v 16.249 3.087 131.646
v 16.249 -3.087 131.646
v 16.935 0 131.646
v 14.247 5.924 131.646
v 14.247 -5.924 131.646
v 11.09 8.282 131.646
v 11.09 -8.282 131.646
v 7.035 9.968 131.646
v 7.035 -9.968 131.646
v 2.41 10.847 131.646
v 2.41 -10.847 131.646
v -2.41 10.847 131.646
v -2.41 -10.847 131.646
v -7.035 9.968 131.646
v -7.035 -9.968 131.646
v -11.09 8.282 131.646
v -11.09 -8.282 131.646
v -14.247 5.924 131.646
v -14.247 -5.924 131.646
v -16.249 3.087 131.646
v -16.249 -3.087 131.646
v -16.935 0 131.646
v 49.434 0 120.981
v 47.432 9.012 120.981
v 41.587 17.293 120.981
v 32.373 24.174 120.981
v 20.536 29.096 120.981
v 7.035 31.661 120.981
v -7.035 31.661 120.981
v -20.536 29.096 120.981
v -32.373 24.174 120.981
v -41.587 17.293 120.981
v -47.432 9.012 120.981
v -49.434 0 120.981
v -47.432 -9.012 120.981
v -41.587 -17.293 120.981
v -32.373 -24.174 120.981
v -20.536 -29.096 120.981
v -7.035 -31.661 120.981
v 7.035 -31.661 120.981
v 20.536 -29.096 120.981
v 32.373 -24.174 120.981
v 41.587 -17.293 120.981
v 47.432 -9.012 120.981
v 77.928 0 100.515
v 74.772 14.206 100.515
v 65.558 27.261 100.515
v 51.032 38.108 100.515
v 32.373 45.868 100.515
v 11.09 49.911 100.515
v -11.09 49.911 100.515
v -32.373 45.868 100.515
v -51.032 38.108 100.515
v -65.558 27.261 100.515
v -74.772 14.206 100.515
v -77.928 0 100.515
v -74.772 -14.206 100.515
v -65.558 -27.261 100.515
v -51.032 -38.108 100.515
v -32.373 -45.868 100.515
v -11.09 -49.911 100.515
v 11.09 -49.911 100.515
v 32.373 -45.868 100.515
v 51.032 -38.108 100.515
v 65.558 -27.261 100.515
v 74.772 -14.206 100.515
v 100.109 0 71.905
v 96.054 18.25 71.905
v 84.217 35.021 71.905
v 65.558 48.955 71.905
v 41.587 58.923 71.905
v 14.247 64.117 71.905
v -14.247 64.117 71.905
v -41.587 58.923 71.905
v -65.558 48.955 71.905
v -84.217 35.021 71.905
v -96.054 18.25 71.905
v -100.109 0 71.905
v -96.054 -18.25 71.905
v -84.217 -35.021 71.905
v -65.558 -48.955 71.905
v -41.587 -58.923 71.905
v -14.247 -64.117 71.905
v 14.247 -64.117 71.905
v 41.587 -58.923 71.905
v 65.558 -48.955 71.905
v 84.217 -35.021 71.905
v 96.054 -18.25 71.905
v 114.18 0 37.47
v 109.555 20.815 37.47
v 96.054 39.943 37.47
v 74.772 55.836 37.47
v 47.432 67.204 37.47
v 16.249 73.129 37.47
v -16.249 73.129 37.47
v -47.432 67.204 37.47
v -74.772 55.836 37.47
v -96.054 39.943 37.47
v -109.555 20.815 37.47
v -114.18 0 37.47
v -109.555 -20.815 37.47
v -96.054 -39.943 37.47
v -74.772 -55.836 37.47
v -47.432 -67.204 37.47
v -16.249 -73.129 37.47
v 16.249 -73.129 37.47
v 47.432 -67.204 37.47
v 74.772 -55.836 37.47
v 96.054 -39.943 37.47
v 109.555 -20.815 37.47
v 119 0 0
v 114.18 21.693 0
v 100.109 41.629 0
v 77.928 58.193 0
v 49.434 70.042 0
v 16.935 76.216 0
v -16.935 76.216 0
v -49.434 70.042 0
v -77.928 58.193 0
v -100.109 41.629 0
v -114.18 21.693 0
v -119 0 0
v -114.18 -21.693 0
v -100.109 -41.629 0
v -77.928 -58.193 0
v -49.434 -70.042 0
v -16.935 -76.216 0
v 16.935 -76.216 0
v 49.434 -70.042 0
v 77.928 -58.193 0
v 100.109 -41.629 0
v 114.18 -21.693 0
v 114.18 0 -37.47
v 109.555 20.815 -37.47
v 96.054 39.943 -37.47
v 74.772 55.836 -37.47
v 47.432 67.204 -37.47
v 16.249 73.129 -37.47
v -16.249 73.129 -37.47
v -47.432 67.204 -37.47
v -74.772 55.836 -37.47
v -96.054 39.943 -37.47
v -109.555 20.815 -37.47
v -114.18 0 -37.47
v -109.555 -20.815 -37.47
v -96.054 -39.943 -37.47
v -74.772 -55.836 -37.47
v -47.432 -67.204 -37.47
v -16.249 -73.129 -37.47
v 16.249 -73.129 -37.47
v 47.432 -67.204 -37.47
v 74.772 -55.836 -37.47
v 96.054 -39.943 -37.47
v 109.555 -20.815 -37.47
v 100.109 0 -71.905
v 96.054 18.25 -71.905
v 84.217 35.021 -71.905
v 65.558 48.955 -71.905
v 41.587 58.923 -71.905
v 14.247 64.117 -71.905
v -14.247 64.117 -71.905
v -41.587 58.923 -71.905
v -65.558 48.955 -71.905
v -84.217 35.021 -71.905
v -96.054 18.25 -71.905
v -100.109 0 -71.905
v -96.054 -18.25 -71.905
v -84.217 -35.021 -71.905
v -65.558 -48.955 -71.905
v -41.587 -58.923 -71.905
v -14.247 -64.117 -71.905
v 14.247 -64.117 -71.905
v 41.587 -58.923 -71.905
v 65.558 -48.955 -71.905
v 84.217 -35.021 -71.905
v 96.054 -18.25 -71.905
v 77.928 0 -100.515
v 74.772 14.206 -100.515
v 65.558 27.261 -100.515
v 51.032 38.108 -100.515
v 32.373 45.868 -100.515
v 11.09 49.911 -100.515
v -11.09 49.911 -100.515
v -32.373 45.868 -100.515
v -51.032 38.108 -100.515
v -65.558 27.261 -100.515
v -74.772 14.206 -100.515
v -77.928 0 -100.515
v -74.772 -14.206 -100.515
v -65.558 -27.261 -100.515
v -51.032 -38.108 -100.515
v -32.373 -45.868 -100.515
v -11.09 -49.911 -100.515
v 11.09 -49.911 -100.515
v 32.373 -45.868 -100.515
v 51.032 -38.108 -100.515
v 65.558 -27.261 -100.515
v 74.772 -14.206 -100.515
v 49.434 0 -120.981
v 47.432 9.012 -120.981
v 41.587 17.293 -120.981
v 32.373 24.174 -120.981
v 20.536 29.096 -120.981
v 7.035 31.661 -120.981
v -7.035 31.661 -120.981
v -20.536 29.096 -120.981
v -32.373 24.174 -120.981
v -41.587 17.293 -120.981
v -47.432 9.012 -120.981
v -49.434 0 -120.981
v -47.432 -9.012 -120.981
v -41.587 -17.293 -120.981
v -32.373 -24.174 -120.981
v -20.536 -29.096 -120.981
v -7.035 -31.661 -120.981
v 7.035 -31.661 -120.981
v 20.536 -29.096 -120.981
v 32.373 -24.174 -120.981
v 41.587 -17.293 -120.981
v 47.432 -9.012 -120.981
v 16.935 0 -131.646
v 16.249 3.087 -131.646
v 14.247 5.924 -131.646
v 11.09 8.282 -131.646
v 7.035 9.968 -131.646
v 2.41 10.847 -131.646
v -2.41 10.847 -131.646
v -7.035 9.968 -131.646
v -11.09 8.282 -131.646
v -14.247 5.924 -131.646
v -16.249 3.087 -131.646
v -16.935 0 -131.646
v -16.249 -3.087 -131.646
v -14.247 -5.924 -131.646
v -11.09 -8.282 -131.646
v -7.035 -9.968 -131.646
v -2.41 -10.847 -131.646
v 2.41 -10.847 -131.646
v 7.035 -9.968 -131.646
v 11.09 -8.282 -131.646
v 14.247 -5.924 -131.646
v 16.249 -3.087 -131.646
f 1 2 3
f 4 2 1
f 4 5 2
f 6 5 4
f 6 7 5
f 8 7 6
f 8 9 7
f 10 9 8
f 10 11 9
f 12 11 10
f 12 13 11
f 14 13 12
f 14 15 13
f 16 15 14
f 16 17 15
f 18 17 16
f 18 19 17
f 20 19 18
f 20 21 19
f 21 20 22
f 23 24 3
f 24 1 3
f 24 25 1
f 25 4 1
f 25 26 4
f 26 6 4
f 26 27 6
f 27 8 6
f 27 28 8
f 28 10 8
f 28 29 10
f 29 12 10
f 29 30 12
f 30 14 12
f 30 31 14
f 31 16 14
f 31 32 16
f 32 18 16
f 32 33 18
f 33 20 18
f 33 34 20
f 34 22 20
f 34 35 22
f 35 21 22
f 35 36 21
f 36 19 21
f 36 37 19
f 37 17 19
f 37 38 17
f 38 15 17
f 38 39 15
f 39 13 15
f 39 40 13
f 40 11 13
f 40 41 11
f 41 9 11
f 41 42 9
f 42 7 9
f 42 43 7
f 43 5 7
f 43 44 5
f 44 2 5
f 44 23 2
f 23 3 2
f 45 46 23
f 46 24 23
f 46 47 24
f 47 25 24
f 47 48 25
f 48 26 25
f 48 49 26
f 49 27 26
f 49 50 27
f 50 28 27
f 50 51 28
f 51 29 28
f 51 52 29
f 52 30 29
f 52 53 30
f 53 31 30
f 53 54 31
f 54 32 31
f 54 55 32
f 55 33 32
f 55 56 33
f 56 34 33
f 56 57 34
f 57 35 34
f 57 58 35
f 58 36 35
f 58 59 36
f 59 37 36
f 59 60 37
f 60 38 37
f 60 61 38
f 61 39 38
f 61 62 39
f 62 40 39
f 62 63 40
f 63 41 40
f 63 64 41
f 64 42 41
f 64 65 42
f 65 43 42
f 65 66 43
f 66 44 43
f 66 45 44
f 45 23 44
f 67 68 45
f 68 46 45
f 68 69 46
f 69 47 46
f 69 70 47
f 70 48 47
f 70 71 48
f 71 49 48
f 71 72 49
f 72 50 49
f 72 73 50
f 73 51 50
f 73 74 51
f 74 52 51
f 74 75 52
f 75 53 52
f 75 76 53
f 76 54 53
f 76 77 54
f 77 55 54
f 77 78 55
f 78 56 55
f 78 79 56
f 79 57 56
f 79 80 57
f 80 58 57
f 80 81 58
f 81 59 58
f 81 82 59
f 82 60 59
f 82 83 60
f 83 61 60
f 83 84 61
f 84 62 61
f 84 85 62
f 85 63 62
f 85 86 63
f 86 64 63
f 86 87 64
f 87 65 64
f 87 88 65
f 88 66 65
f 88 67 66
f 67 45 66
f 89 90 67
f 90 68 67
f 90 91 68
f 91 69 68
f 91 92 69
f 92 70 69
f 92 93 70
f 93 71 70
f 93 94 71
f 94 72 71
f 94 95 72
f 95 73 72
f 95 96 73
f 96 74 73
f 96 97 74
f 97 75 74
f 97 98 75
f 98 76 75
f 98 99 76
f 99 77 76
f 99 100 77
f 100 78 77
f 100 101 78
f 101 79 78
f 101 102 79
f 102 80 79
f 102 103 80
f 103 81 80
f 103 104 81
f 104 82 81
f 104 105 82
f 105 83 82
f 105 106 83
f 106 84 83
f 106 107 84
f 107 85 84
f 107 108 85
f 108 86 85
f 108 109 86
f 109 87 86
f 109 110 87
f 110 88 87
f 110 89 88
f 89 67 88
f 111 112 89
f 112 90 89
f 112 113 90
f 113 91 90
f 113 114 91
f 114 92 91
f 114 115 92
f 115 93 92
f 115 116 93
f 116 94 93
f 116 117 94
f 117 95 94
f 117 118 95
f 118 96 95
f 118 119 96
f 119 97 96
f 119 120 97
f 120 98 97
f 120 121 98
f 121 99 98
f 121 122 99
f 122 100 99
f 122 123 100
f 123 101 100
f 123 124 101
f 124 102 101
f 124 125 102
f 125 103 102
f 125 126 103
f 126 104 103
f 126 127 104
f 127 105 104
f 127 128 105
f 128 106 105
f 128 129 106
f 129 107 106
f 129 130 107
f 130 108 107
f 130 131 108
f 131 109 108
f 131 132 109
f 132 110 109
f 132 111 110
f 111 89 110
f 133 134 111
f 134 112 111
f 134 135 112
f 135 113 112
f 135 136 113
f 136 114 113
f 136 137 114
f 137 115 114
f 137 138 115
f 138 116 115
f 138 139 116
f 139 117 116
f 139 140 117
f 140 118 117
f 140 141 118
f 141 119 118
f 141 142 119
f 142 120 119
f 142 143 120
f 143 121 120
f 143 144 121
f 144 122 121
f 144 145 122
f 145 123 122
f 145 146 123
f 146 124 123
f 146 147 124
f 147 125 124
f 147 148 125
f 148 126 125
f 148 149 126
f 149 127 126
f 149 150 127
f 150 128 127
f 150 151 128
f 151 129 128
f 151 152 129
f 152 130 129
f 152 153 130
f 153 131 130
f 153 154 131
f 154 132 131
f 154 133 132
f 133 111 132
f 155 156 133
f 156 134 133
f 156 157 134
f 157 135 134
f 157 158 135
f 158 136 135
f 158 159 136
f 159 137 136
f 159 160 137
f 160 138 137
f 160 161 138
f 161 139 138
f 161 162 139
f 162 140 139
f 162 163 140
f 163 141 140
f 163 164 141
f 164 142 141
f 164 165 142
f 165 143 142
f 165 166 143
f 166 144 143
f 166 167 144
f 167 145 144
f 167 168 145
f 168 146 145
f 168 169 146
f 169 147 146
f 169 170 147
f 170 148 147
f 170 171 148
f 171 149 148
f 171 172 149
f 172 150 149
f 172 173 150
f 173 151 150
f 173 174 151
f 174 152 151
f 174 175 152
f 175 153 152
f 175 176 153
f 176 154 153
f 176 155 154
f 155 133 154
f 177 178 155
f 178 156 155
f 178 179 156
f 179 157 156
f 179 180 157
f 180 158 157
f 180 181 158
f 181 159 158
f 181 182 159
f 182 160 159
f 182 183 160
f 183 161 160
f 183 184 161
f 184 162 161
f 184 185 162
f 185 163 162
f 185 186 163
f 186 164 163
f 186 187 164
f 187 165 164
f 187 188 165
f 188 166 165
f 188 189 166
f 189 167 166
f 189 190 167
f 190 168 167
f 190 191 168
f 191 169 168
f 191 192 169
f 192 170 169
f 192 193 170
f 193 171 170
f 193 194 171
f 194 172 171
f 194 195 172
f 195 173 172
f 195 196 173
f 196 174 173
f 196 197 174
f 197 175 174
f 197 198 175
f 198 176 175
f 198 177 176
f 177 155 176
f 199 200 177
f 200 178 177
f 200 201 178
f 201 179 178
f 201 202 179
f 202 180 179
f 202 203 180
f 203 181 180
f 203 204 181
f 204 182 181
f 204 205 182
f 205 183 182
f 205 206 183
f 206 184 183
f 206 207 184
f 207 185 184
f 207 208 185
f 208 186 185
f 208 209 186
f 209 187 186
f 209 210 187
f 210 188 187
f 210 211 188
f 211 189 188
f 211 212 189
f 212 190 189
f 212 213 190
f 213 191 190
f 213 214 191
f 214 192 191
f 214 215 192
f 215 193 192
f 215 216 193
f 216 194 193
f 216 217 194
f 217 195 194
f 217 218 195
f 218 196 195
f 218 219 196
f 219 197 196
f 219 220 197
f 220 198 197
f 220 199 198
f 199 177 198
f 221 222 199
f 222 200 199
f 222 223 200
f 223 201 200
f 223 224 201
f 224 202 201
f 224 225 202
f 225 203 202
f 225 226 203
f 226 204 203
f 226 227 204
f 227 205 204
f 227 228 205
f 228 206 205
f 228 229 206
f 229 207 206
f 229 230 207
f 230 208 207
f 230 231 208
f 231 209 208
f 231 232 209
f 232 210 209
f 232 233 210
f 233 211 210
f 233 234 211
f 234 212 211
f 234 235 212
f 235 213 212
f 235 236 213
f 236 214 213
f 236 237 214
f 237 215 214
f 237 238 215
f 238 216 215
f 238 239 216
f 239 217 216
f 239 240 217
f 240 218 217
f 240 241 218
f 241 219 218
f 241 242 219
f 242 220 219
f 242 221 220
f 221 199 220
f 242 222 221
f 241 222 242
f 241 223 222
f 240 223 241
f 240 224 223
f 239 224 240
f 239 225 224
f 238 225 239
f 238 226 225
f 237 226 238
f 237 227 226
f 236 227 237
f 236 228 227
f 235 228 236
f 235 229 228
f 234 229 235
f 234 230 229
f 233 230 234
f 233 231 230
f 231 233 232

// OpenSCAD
// Generated by SolidPython 1.0.1 on 2020-07-29 00:46:53


scale(v = [17, 11, 19]) {
	sphere(r = 7);
}
/***********************************************
*********      SolidPython code:      **********
************************************************
 
# import packages: SolidPython
from solid import *
from solid.utils import *
from itertools import chain, combinations, permutations


class Resize:

    def __init__(self, scad_file):
        self.scad_file = scad_file
        #self.scad_file = import_scad(scad_file)
        # cone/cylinder param:
        self.r1 = 0
        self.r2 = 0
        self.h = 0
        # rectangular prism param:
        self.w = 0
        self.l = 0
        # ellipse param:
        self.r = 0

    # import OpenScad code (file name corresponds to shape)


    # classify shape + parameters
    def assign(self, param1, param2, param3):
        if self.scad_file == 'cone.scad':
            self.r1 = param1
            self.r2 = param2
            self.h = param3
        elif self.scad_file == 'cylinder.scad':
            self.r1 = param1
            self.r2 = param2
            self.h = param3
        elif self.scad_file == 'rectangularPrism.scad':
            self.h = param1
            self.l = param2
            self.w = param3
        else:
            self.r = param1
            self.h = param2

    # resize parameters
    def iterate(self):
        x = range(3, 20, 2)
        i = 1
        if self.scad_file == 'cone.scad':
            tempList = list(permutations(x, 2))
            for temp in tempList:
                param1 = temp[0]
                param2 = temp[1]
                filepath = 'produced_scad_files/' + 'cone' + str(param1) + '_' + str(param2) + '_' + '.scad'
                scad_render_to_file(cylinder(h=param1, r1=param2, r2=0), filepath)

        elif self.scad_file == 'cylinder.scad':
            tempList = list(permutations(x, 3))
            for temp in tempList:
                param1 = temp[0]
                param2 = temp[1]
                filepath = 'produced_scad_files/' + 'cylinder' + str(param1) + '_' + str(param2) + '_' + '.scad'
                scad_render_to_file(cylinder(h=param1, r1=param2, r2=param2), filepath)

        elif self.scad_file == 'rectangularPrism.scad':
            tempList = list(permutations(x, 3))
            for temp in tempList:
                param1 = temp[0]
                param2 = temp[1]
                param3 = temp[2]
                filepath = 'produced_scad_files/' + 'rectangularPrism' + str(param1) + '_' + str(param2) + '_' + str(
                    param3) + '.scad'
                scad_render_to_file(cube(size=(param1, param2, param3)), filepath)

        elif self.scad_file == 'ellipse.scad':
            tempList = list(permutations(x, 4))
            for temp in tempList:
                param1 = temp[0]
                param2 = temp[1]
                param3 = temp[2]
                param4 = temp[3]
                filepath = 'produced_scad_files/' + 'ellipse' + str(param1) + '_' + str(param2) + '_' + str(param3) + '_' + str(param4) + '.scad'
                scad_render_to_file(scale([param1, param2, param3])(sphere(r=param4)), filepath)

    def render_to_scadfile(self):
        scad_render_to_file(scad, 'example.scad') 
 
************************************************/
